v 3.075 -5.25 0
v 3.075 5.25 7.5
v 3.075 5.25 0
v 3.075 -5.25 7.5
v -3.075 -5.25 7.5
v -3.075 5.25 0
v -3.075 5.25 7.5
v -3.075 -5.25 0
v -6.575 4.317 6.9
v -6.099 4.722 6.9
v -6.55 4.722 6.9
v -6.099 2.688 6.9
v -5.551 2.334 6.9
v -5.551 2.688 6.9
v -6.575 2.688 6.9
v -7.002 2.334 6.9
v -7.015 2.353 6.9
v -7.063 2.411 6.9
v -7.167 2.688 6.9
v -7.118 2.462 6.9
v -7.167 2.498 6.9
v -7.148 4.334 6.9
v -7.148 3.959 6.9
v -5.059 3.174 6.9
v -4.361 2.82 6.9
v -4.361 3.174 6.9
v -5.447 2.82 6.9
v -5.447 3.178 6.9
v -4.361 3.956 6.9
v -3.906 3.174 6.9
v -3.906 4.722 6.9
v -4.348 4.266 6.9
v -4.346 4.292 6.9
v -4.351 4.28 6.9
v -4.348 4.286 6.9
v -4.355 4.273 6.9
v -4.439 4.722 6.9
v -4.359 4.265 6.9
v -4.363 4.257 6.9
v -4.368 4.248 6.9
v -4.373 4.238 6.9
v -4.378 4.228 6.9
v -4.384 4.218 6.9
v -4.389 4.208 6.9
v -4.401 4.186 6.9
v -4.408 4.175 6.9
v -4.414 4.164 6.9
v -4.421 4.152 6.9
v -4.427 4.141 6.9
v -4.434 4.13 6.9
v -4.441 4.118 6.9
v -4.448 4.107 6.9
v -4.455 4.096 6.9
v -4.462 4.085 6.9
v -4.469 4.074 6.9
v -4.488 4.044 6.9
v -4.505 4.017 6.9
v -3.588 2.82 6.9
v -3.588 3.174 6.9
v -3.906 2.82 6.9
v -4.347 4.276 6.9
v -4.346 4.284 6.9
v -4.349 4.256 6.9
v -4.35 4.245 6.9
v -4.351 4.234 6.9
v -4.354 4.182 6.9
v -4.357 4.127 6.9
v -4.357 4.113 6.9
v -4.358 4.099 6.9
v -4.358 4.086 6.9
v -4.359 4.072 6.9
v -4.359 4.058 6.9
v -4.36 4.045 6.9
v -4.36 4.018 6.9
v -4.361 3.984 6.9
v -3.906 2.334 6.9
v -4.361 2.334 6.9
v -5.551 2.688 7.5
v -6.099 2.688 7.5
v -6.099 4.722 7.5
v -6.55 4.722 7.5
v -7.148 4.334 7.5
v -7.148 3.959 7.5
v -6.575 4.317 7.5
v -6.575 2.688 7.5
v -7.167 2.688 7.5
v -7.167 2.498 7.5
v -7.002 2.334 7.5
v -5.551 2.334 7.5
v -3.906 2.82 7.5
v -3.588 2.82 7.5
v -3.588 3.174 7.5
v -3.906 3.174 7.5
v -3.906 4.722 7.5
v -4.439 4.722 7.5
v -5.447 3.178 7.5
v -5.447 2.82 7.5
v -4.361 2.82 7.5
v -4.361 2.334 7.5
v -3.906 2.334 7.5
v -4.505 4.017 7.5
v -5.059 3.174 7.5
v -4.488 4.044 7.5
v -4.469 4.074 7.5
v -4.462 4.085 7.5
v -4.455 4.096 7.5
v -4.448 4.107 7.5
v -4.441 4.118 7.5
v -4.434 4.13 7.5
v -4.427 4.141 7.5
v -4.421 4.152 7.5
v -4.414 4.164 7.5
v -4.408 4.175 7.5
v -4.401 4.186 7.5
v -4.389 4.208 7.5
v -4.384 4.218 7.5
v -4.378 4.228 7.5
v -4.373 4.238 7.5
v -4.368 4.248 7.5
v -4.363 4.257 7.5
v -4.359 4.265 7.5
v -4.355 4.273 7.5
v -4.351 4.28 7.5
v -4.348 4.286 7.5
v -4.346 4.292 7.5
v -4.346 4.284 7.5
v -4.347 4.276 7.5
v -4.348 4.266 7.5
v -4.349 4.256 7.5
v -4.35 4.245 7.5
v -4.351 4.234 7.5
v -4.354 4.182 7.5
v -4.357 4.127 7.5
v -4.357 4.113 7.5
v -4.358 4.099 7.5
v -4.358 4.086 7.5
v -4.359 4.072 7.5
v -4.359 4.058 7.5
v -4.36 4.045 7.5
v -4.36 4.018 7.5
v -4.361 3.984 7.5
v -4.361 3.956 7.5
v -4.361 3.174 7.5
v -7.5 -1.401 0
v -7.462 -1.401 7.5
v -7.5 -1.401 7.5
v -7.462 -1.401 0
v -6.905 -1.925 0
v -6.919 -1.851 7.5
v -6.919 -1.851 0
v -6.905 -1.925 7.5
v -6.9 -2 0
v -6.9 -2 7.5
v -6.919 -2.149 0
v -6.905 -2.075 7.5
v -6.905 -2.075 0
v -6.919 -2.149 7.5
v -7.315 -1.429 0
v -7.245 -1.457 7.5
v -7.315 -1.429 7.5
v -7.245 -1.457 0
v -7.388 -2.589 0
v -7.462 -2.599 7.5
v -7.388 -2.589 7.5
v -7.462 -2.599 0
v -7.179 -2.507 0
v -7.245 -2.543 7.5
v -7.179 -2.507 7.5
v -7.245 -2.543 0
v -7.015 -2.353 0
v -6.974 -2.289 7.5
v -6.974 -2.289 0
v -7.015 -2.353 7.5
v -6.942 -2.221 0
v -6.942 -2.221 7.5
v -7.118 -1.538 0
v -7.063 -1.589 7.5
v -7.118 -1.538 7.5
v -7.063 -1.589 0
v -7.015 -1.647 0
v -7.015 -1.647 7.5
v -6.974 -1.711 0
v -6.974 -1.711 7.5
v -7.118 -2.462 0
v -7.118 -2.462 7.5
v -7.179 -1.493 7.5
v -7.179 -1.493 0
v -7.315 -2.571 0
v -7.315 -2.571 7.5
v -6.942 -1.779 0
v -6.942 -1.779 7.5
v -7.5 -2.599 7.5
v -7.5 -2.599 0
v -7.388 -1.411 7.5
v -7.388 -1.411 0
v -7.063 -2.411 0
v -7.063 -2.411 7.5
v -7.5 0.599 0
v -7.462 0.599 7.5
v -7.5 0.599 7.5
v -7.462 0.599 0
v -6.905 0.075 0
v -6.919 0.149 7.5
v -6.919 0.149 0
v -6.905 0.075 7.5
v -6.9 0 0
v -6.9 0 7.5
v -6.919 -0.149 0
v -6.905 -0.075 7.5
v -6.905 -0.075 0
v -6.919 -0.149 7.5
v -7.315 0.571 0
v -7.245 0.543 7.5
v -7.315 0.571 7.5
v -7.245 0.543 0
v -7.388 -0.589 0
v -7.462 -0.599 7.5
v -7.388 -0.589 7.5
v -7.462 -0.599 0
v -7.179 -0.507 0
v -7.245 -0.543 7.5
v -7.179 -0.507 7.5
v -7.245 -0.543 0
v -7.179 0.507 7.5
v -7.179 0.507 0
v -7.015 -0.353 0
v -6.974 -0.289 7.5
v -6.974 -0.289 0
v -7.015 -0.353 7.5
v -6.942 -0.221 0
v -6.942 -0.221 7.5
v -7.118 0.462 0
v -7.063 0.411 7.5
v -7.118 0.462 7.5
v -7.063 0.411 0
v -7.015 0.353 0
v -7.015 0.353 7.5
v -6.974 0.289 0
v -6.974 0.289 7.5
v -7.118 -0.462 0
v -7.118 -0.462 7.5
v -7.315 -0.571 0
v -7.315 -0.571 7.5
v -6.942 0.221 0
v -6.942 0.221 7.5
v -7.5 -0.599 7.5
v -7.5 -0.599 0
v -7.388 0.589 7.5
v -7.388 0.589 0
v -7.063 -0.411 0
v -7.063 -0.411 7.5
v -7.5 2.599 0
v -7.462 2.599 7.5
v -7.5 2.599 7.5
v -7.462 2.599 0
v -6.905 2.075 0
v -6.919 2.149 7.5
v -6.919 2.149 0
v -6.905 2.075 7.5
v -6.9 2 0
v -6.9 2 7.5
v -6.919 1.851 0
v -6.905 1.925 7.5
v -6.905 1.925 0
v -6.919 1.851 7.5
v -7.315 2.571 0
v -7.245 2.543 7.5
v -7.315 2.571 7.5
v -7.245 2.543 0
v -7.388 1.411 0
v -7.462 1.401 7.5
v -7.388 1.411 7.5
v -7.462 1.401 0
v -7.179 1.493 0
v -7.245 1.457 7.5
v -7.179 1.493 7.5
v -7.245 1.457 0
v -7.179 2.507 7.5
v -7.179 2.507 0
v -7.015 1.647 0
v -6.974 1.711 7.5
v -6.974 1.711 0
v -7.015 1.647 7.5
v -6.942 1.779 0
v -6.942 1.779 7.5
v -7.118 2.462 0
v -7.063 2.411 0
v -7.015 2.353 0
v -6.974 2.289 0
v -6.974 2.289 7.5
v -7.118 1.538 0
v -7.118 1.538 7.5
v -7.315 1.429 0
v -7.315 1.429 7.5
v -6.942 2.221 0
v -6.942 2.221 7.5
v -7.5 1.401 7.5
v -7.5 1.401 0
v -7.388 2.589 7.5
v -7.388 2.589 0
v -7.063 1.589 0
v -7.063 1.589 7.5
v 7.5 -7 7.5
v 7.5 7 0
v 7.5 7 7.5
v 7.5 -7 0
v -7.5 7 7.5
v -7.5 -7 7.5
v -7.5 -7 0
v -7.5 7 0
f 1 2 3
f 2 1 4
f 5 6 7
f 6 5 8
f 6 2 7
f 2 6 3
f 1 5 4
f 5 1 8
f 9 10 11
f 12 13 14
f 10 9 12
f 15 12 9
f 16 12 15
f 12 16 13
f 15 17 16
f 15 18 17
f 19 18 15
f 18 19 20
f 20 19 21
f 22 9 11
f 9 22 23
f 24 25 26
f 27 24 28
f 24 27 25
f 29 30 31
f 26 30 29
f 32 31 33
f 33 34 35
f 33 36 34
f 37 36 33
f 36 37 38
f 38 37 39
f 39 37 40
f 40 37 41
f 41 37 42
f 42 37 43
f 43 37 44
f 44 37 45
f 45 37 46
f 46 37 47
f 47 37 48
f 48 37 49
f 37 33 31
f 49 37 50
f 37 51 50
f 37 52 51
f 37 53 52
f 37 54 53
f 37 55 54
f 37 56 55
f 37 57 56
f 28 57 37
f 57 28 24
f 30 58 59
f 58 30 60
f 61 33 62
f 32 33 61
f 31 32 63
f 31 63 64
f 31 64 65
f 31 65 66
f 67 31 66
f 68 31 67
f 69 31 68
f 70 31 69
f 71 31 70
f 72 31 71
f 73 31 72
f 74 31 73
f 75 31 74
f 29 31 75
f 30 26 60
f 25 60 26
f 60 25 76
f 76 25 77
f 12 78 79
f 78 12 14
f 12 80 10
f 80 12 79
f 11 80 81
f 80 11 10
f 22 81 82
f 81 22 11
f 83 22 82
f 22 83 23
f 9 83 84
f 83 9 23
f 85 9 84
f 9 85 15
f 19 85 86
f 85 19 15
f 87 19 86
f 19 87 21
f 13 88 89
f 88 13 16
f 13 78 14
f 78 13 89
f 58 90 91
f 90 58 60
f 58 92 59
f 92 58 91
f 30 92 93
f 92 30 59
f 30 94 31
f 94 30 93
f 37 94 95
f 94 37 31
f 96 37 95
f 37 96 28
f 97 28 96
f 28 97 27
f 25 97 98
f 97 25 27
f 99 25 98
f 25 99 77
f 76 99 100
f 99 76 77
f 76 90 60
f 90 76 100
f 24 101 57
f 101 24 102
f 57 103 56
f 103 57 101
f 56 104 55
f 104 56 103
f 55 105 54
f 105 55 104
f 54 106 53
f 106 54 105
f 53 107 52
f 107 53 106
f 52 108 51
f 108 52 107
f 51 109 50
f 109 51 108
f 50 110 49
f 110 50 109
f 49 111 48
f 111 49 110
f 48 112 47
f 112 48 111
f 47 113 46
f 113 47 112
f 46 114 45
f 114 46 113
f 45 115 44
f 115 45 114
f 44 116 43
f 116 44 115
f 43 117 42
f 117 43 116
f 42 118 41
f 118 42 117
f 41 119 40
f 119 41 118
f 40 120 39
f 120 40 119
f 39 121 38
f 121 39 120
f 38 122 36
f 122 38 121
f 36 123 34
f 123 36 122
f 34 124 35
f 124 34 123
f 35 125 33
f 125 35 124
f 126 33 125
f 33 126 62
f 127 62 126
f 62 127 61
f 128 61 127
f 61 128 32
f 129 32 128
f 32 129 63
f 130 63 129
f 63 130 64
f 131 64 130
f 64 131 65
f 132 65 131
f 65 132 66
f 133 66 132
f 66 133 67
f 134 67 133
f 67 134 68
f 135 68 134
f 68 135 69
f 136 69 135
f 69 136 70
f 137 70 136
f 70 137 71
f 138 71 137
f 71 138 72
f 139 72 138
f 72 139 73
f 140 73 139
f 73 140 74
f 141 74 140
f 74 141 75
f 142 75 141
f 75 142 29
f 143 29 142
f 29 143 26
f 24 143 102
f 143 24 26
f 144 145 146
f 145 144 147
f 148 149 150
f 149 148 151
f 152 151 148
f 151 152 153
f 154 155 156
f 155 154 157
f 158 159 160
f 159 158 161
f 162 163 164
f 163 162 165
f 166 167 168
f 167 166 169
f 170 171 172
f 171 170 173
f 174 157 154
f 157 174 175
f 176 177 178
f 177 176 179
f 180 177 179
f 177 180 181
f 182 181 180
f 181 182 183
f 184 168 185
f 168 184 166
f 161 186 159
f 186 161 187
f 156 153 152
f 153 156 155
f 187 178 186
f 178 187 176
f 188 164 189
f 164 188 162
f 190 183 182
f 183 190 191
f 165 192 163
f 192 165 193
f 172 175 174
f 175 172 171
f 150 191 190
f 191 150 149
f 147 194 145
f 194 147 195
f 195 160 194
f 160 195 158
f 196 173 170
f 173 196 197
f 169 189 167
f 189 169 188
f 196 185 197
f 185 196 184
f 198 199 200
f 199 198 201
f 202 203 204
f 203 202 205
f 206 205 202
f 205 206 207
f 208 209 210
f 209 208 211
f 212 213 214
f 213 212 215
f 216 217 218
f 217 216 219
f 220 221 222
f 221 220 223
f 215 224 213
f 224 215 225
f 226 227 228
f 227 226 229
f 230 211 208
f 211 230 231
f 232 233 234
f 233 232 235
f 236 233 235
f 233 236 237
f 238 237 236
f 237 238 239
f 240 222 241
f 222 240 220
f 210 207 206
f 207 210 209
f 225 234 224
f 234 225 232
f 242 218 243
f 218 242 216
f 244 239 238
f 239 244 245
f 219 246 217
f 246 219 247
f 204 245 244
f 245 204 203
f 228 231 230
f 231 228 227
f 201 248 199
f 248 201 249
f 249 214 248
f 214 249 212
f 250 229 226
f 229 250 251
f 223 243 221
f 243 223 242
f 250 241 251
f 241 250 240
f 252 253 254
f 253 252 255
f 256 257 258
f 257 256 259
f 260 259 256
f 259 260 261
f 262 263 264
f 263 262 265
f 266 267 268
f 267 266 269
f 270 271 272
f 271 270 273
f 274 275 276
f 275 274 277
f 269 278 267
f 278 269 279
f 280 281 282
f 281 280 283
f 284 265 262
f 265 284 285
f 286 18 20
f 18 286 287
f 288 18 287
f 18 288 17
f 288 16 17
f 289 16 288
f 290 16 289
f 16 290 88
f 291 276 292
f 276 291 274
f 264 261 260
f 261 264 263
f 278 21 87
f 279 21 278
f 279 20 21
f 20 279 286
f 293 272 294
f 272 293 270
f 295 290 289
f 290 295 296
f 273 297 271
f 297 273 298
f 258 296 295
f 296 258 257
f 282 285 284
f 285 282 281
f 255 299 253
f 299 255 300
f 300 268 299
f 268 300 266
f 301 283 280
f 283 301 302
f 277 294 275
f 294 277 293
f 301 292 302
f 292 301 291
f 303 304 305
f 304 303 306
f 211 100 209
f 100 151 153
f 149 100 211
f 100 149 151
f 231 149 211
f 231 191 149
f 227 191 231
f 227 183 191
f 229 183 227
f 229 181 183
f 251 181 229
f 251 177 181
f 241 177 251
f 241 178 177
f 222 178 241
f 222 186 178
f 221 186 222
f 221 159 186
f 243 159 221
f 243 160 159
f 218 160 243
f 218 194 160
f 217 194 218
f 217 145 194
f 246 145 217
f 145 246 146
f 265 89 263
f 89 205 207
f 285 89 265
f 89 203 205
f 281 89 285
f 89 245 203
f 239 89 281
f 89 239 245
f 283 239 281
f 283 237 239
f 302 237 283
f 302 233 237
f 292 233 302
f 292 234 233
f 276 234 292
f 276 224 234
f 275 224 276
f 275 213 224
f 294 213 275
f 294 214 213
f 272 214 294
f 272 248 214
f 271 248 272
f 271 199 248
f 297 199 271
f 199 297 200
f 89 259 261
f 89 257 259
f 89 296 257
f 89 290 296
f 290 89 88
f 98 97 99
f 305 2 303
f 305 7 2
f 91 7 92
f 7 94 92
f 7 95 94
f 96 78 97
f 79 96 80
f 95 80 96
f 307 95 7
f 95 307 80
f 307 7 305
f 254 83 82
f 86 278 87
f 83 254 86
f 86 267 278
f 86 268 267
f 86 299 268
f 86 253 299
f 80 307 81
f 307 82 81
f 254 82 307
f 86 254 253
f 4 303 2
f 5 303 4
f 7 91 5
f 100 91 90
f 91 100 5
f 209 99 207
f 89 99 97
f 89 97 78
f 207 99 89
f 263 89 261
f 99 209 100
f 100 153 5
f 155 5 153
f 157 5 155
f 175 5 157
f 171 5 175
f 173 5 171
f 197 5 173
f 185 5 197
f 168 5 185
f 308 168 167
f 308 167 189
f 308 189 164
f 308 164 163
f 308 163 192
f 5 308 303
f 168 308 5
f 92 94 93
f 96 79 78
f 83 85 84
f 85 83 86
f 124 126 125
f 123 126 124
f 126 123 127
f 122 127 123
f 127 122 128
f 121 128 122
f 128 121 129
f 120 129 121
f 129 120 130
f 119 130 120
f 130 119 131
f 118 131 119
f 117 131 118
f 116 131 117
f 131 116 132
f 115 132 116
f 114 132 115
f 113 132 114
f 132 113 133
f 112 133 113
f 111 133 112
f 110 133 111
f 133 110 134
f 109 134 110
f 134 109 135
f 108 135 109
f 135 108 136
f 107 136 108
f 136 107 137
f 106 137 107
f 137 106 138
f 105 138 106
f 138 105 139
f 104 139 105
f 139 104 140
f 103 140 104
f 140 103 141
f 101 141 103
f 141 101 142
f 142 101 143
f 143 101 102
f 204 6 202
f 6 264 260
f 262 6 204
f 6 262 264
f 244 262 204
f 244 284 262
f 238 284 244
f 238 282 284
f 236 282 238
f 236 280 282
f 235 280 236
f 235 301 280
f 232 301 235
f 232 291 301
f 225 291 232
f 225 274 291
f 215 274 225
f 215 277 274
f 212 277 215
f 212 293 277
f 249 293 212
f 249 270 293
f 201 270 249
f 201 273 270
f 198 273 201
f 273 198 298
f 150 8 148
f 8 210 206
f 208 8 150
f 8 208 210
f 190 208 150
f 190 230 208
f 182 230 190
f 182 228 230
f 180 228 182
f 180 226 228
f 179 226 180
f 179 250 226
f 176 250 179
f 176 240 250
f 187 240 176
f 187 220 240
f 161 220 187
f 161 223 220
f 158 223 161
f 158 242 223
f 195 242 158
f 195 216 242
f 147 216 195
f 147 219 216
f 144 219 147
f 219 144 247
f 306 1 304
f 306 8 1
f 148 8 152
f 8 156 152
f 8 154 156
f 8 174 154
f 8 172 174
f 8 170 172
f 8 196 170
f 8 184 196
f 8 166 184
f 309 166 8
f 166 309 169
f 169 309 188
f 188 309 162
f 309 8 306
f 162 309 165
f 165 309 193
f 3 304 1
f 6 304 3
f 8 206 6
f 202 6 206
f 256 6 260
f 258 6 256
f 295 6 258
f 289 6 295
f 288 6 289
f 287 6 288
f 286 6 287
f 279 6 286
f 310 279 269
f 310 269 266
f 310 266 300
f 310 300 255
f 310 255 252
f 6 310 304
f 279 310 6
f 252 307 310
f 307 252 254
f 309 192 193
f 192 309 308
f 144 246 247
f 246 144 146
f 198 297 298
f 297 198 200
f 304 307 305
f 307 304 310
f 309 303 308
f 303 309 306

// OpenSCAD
$fn = 50;

difference() {
	union() {
		translate(v = [0, -5, 0]) {
			rotate(a = [0, 0, 0]) {
				difference() {
					union() {
						translate(v = [-7.5, -2.0, 0]) {
							cube(size = [15.0, 14.0, 7.5]);
						}
					}
					union() {
						translate(v = [-3.075, -0.25, -0.1]) {
							cube(size = [6.15, 10.5, 7.7]);
						}
						translate(v = [-5.5, 8.5, 6.9]) {
							linear_extrude(height = 0.7) {
								text(font = "Arial:style=Bold", halign = "center", size = 2.5, text = "14", valign = "center");
							}
						}
						translate(v = [-7.5, 3, -0.1]) {
							cylinder(h = 7.7, r = 0.6);
						}
						translate(v = [-7.5, 5, -0.1]) {
							cylinder(h = 7.7, r = 0.6);
						}
						translate(v = [-7.5, 7, -0.1]) {
							cylinder(h = 7.7, r = 0.6);
						}
					}
				}
			}
		}
	}
	union();
}
